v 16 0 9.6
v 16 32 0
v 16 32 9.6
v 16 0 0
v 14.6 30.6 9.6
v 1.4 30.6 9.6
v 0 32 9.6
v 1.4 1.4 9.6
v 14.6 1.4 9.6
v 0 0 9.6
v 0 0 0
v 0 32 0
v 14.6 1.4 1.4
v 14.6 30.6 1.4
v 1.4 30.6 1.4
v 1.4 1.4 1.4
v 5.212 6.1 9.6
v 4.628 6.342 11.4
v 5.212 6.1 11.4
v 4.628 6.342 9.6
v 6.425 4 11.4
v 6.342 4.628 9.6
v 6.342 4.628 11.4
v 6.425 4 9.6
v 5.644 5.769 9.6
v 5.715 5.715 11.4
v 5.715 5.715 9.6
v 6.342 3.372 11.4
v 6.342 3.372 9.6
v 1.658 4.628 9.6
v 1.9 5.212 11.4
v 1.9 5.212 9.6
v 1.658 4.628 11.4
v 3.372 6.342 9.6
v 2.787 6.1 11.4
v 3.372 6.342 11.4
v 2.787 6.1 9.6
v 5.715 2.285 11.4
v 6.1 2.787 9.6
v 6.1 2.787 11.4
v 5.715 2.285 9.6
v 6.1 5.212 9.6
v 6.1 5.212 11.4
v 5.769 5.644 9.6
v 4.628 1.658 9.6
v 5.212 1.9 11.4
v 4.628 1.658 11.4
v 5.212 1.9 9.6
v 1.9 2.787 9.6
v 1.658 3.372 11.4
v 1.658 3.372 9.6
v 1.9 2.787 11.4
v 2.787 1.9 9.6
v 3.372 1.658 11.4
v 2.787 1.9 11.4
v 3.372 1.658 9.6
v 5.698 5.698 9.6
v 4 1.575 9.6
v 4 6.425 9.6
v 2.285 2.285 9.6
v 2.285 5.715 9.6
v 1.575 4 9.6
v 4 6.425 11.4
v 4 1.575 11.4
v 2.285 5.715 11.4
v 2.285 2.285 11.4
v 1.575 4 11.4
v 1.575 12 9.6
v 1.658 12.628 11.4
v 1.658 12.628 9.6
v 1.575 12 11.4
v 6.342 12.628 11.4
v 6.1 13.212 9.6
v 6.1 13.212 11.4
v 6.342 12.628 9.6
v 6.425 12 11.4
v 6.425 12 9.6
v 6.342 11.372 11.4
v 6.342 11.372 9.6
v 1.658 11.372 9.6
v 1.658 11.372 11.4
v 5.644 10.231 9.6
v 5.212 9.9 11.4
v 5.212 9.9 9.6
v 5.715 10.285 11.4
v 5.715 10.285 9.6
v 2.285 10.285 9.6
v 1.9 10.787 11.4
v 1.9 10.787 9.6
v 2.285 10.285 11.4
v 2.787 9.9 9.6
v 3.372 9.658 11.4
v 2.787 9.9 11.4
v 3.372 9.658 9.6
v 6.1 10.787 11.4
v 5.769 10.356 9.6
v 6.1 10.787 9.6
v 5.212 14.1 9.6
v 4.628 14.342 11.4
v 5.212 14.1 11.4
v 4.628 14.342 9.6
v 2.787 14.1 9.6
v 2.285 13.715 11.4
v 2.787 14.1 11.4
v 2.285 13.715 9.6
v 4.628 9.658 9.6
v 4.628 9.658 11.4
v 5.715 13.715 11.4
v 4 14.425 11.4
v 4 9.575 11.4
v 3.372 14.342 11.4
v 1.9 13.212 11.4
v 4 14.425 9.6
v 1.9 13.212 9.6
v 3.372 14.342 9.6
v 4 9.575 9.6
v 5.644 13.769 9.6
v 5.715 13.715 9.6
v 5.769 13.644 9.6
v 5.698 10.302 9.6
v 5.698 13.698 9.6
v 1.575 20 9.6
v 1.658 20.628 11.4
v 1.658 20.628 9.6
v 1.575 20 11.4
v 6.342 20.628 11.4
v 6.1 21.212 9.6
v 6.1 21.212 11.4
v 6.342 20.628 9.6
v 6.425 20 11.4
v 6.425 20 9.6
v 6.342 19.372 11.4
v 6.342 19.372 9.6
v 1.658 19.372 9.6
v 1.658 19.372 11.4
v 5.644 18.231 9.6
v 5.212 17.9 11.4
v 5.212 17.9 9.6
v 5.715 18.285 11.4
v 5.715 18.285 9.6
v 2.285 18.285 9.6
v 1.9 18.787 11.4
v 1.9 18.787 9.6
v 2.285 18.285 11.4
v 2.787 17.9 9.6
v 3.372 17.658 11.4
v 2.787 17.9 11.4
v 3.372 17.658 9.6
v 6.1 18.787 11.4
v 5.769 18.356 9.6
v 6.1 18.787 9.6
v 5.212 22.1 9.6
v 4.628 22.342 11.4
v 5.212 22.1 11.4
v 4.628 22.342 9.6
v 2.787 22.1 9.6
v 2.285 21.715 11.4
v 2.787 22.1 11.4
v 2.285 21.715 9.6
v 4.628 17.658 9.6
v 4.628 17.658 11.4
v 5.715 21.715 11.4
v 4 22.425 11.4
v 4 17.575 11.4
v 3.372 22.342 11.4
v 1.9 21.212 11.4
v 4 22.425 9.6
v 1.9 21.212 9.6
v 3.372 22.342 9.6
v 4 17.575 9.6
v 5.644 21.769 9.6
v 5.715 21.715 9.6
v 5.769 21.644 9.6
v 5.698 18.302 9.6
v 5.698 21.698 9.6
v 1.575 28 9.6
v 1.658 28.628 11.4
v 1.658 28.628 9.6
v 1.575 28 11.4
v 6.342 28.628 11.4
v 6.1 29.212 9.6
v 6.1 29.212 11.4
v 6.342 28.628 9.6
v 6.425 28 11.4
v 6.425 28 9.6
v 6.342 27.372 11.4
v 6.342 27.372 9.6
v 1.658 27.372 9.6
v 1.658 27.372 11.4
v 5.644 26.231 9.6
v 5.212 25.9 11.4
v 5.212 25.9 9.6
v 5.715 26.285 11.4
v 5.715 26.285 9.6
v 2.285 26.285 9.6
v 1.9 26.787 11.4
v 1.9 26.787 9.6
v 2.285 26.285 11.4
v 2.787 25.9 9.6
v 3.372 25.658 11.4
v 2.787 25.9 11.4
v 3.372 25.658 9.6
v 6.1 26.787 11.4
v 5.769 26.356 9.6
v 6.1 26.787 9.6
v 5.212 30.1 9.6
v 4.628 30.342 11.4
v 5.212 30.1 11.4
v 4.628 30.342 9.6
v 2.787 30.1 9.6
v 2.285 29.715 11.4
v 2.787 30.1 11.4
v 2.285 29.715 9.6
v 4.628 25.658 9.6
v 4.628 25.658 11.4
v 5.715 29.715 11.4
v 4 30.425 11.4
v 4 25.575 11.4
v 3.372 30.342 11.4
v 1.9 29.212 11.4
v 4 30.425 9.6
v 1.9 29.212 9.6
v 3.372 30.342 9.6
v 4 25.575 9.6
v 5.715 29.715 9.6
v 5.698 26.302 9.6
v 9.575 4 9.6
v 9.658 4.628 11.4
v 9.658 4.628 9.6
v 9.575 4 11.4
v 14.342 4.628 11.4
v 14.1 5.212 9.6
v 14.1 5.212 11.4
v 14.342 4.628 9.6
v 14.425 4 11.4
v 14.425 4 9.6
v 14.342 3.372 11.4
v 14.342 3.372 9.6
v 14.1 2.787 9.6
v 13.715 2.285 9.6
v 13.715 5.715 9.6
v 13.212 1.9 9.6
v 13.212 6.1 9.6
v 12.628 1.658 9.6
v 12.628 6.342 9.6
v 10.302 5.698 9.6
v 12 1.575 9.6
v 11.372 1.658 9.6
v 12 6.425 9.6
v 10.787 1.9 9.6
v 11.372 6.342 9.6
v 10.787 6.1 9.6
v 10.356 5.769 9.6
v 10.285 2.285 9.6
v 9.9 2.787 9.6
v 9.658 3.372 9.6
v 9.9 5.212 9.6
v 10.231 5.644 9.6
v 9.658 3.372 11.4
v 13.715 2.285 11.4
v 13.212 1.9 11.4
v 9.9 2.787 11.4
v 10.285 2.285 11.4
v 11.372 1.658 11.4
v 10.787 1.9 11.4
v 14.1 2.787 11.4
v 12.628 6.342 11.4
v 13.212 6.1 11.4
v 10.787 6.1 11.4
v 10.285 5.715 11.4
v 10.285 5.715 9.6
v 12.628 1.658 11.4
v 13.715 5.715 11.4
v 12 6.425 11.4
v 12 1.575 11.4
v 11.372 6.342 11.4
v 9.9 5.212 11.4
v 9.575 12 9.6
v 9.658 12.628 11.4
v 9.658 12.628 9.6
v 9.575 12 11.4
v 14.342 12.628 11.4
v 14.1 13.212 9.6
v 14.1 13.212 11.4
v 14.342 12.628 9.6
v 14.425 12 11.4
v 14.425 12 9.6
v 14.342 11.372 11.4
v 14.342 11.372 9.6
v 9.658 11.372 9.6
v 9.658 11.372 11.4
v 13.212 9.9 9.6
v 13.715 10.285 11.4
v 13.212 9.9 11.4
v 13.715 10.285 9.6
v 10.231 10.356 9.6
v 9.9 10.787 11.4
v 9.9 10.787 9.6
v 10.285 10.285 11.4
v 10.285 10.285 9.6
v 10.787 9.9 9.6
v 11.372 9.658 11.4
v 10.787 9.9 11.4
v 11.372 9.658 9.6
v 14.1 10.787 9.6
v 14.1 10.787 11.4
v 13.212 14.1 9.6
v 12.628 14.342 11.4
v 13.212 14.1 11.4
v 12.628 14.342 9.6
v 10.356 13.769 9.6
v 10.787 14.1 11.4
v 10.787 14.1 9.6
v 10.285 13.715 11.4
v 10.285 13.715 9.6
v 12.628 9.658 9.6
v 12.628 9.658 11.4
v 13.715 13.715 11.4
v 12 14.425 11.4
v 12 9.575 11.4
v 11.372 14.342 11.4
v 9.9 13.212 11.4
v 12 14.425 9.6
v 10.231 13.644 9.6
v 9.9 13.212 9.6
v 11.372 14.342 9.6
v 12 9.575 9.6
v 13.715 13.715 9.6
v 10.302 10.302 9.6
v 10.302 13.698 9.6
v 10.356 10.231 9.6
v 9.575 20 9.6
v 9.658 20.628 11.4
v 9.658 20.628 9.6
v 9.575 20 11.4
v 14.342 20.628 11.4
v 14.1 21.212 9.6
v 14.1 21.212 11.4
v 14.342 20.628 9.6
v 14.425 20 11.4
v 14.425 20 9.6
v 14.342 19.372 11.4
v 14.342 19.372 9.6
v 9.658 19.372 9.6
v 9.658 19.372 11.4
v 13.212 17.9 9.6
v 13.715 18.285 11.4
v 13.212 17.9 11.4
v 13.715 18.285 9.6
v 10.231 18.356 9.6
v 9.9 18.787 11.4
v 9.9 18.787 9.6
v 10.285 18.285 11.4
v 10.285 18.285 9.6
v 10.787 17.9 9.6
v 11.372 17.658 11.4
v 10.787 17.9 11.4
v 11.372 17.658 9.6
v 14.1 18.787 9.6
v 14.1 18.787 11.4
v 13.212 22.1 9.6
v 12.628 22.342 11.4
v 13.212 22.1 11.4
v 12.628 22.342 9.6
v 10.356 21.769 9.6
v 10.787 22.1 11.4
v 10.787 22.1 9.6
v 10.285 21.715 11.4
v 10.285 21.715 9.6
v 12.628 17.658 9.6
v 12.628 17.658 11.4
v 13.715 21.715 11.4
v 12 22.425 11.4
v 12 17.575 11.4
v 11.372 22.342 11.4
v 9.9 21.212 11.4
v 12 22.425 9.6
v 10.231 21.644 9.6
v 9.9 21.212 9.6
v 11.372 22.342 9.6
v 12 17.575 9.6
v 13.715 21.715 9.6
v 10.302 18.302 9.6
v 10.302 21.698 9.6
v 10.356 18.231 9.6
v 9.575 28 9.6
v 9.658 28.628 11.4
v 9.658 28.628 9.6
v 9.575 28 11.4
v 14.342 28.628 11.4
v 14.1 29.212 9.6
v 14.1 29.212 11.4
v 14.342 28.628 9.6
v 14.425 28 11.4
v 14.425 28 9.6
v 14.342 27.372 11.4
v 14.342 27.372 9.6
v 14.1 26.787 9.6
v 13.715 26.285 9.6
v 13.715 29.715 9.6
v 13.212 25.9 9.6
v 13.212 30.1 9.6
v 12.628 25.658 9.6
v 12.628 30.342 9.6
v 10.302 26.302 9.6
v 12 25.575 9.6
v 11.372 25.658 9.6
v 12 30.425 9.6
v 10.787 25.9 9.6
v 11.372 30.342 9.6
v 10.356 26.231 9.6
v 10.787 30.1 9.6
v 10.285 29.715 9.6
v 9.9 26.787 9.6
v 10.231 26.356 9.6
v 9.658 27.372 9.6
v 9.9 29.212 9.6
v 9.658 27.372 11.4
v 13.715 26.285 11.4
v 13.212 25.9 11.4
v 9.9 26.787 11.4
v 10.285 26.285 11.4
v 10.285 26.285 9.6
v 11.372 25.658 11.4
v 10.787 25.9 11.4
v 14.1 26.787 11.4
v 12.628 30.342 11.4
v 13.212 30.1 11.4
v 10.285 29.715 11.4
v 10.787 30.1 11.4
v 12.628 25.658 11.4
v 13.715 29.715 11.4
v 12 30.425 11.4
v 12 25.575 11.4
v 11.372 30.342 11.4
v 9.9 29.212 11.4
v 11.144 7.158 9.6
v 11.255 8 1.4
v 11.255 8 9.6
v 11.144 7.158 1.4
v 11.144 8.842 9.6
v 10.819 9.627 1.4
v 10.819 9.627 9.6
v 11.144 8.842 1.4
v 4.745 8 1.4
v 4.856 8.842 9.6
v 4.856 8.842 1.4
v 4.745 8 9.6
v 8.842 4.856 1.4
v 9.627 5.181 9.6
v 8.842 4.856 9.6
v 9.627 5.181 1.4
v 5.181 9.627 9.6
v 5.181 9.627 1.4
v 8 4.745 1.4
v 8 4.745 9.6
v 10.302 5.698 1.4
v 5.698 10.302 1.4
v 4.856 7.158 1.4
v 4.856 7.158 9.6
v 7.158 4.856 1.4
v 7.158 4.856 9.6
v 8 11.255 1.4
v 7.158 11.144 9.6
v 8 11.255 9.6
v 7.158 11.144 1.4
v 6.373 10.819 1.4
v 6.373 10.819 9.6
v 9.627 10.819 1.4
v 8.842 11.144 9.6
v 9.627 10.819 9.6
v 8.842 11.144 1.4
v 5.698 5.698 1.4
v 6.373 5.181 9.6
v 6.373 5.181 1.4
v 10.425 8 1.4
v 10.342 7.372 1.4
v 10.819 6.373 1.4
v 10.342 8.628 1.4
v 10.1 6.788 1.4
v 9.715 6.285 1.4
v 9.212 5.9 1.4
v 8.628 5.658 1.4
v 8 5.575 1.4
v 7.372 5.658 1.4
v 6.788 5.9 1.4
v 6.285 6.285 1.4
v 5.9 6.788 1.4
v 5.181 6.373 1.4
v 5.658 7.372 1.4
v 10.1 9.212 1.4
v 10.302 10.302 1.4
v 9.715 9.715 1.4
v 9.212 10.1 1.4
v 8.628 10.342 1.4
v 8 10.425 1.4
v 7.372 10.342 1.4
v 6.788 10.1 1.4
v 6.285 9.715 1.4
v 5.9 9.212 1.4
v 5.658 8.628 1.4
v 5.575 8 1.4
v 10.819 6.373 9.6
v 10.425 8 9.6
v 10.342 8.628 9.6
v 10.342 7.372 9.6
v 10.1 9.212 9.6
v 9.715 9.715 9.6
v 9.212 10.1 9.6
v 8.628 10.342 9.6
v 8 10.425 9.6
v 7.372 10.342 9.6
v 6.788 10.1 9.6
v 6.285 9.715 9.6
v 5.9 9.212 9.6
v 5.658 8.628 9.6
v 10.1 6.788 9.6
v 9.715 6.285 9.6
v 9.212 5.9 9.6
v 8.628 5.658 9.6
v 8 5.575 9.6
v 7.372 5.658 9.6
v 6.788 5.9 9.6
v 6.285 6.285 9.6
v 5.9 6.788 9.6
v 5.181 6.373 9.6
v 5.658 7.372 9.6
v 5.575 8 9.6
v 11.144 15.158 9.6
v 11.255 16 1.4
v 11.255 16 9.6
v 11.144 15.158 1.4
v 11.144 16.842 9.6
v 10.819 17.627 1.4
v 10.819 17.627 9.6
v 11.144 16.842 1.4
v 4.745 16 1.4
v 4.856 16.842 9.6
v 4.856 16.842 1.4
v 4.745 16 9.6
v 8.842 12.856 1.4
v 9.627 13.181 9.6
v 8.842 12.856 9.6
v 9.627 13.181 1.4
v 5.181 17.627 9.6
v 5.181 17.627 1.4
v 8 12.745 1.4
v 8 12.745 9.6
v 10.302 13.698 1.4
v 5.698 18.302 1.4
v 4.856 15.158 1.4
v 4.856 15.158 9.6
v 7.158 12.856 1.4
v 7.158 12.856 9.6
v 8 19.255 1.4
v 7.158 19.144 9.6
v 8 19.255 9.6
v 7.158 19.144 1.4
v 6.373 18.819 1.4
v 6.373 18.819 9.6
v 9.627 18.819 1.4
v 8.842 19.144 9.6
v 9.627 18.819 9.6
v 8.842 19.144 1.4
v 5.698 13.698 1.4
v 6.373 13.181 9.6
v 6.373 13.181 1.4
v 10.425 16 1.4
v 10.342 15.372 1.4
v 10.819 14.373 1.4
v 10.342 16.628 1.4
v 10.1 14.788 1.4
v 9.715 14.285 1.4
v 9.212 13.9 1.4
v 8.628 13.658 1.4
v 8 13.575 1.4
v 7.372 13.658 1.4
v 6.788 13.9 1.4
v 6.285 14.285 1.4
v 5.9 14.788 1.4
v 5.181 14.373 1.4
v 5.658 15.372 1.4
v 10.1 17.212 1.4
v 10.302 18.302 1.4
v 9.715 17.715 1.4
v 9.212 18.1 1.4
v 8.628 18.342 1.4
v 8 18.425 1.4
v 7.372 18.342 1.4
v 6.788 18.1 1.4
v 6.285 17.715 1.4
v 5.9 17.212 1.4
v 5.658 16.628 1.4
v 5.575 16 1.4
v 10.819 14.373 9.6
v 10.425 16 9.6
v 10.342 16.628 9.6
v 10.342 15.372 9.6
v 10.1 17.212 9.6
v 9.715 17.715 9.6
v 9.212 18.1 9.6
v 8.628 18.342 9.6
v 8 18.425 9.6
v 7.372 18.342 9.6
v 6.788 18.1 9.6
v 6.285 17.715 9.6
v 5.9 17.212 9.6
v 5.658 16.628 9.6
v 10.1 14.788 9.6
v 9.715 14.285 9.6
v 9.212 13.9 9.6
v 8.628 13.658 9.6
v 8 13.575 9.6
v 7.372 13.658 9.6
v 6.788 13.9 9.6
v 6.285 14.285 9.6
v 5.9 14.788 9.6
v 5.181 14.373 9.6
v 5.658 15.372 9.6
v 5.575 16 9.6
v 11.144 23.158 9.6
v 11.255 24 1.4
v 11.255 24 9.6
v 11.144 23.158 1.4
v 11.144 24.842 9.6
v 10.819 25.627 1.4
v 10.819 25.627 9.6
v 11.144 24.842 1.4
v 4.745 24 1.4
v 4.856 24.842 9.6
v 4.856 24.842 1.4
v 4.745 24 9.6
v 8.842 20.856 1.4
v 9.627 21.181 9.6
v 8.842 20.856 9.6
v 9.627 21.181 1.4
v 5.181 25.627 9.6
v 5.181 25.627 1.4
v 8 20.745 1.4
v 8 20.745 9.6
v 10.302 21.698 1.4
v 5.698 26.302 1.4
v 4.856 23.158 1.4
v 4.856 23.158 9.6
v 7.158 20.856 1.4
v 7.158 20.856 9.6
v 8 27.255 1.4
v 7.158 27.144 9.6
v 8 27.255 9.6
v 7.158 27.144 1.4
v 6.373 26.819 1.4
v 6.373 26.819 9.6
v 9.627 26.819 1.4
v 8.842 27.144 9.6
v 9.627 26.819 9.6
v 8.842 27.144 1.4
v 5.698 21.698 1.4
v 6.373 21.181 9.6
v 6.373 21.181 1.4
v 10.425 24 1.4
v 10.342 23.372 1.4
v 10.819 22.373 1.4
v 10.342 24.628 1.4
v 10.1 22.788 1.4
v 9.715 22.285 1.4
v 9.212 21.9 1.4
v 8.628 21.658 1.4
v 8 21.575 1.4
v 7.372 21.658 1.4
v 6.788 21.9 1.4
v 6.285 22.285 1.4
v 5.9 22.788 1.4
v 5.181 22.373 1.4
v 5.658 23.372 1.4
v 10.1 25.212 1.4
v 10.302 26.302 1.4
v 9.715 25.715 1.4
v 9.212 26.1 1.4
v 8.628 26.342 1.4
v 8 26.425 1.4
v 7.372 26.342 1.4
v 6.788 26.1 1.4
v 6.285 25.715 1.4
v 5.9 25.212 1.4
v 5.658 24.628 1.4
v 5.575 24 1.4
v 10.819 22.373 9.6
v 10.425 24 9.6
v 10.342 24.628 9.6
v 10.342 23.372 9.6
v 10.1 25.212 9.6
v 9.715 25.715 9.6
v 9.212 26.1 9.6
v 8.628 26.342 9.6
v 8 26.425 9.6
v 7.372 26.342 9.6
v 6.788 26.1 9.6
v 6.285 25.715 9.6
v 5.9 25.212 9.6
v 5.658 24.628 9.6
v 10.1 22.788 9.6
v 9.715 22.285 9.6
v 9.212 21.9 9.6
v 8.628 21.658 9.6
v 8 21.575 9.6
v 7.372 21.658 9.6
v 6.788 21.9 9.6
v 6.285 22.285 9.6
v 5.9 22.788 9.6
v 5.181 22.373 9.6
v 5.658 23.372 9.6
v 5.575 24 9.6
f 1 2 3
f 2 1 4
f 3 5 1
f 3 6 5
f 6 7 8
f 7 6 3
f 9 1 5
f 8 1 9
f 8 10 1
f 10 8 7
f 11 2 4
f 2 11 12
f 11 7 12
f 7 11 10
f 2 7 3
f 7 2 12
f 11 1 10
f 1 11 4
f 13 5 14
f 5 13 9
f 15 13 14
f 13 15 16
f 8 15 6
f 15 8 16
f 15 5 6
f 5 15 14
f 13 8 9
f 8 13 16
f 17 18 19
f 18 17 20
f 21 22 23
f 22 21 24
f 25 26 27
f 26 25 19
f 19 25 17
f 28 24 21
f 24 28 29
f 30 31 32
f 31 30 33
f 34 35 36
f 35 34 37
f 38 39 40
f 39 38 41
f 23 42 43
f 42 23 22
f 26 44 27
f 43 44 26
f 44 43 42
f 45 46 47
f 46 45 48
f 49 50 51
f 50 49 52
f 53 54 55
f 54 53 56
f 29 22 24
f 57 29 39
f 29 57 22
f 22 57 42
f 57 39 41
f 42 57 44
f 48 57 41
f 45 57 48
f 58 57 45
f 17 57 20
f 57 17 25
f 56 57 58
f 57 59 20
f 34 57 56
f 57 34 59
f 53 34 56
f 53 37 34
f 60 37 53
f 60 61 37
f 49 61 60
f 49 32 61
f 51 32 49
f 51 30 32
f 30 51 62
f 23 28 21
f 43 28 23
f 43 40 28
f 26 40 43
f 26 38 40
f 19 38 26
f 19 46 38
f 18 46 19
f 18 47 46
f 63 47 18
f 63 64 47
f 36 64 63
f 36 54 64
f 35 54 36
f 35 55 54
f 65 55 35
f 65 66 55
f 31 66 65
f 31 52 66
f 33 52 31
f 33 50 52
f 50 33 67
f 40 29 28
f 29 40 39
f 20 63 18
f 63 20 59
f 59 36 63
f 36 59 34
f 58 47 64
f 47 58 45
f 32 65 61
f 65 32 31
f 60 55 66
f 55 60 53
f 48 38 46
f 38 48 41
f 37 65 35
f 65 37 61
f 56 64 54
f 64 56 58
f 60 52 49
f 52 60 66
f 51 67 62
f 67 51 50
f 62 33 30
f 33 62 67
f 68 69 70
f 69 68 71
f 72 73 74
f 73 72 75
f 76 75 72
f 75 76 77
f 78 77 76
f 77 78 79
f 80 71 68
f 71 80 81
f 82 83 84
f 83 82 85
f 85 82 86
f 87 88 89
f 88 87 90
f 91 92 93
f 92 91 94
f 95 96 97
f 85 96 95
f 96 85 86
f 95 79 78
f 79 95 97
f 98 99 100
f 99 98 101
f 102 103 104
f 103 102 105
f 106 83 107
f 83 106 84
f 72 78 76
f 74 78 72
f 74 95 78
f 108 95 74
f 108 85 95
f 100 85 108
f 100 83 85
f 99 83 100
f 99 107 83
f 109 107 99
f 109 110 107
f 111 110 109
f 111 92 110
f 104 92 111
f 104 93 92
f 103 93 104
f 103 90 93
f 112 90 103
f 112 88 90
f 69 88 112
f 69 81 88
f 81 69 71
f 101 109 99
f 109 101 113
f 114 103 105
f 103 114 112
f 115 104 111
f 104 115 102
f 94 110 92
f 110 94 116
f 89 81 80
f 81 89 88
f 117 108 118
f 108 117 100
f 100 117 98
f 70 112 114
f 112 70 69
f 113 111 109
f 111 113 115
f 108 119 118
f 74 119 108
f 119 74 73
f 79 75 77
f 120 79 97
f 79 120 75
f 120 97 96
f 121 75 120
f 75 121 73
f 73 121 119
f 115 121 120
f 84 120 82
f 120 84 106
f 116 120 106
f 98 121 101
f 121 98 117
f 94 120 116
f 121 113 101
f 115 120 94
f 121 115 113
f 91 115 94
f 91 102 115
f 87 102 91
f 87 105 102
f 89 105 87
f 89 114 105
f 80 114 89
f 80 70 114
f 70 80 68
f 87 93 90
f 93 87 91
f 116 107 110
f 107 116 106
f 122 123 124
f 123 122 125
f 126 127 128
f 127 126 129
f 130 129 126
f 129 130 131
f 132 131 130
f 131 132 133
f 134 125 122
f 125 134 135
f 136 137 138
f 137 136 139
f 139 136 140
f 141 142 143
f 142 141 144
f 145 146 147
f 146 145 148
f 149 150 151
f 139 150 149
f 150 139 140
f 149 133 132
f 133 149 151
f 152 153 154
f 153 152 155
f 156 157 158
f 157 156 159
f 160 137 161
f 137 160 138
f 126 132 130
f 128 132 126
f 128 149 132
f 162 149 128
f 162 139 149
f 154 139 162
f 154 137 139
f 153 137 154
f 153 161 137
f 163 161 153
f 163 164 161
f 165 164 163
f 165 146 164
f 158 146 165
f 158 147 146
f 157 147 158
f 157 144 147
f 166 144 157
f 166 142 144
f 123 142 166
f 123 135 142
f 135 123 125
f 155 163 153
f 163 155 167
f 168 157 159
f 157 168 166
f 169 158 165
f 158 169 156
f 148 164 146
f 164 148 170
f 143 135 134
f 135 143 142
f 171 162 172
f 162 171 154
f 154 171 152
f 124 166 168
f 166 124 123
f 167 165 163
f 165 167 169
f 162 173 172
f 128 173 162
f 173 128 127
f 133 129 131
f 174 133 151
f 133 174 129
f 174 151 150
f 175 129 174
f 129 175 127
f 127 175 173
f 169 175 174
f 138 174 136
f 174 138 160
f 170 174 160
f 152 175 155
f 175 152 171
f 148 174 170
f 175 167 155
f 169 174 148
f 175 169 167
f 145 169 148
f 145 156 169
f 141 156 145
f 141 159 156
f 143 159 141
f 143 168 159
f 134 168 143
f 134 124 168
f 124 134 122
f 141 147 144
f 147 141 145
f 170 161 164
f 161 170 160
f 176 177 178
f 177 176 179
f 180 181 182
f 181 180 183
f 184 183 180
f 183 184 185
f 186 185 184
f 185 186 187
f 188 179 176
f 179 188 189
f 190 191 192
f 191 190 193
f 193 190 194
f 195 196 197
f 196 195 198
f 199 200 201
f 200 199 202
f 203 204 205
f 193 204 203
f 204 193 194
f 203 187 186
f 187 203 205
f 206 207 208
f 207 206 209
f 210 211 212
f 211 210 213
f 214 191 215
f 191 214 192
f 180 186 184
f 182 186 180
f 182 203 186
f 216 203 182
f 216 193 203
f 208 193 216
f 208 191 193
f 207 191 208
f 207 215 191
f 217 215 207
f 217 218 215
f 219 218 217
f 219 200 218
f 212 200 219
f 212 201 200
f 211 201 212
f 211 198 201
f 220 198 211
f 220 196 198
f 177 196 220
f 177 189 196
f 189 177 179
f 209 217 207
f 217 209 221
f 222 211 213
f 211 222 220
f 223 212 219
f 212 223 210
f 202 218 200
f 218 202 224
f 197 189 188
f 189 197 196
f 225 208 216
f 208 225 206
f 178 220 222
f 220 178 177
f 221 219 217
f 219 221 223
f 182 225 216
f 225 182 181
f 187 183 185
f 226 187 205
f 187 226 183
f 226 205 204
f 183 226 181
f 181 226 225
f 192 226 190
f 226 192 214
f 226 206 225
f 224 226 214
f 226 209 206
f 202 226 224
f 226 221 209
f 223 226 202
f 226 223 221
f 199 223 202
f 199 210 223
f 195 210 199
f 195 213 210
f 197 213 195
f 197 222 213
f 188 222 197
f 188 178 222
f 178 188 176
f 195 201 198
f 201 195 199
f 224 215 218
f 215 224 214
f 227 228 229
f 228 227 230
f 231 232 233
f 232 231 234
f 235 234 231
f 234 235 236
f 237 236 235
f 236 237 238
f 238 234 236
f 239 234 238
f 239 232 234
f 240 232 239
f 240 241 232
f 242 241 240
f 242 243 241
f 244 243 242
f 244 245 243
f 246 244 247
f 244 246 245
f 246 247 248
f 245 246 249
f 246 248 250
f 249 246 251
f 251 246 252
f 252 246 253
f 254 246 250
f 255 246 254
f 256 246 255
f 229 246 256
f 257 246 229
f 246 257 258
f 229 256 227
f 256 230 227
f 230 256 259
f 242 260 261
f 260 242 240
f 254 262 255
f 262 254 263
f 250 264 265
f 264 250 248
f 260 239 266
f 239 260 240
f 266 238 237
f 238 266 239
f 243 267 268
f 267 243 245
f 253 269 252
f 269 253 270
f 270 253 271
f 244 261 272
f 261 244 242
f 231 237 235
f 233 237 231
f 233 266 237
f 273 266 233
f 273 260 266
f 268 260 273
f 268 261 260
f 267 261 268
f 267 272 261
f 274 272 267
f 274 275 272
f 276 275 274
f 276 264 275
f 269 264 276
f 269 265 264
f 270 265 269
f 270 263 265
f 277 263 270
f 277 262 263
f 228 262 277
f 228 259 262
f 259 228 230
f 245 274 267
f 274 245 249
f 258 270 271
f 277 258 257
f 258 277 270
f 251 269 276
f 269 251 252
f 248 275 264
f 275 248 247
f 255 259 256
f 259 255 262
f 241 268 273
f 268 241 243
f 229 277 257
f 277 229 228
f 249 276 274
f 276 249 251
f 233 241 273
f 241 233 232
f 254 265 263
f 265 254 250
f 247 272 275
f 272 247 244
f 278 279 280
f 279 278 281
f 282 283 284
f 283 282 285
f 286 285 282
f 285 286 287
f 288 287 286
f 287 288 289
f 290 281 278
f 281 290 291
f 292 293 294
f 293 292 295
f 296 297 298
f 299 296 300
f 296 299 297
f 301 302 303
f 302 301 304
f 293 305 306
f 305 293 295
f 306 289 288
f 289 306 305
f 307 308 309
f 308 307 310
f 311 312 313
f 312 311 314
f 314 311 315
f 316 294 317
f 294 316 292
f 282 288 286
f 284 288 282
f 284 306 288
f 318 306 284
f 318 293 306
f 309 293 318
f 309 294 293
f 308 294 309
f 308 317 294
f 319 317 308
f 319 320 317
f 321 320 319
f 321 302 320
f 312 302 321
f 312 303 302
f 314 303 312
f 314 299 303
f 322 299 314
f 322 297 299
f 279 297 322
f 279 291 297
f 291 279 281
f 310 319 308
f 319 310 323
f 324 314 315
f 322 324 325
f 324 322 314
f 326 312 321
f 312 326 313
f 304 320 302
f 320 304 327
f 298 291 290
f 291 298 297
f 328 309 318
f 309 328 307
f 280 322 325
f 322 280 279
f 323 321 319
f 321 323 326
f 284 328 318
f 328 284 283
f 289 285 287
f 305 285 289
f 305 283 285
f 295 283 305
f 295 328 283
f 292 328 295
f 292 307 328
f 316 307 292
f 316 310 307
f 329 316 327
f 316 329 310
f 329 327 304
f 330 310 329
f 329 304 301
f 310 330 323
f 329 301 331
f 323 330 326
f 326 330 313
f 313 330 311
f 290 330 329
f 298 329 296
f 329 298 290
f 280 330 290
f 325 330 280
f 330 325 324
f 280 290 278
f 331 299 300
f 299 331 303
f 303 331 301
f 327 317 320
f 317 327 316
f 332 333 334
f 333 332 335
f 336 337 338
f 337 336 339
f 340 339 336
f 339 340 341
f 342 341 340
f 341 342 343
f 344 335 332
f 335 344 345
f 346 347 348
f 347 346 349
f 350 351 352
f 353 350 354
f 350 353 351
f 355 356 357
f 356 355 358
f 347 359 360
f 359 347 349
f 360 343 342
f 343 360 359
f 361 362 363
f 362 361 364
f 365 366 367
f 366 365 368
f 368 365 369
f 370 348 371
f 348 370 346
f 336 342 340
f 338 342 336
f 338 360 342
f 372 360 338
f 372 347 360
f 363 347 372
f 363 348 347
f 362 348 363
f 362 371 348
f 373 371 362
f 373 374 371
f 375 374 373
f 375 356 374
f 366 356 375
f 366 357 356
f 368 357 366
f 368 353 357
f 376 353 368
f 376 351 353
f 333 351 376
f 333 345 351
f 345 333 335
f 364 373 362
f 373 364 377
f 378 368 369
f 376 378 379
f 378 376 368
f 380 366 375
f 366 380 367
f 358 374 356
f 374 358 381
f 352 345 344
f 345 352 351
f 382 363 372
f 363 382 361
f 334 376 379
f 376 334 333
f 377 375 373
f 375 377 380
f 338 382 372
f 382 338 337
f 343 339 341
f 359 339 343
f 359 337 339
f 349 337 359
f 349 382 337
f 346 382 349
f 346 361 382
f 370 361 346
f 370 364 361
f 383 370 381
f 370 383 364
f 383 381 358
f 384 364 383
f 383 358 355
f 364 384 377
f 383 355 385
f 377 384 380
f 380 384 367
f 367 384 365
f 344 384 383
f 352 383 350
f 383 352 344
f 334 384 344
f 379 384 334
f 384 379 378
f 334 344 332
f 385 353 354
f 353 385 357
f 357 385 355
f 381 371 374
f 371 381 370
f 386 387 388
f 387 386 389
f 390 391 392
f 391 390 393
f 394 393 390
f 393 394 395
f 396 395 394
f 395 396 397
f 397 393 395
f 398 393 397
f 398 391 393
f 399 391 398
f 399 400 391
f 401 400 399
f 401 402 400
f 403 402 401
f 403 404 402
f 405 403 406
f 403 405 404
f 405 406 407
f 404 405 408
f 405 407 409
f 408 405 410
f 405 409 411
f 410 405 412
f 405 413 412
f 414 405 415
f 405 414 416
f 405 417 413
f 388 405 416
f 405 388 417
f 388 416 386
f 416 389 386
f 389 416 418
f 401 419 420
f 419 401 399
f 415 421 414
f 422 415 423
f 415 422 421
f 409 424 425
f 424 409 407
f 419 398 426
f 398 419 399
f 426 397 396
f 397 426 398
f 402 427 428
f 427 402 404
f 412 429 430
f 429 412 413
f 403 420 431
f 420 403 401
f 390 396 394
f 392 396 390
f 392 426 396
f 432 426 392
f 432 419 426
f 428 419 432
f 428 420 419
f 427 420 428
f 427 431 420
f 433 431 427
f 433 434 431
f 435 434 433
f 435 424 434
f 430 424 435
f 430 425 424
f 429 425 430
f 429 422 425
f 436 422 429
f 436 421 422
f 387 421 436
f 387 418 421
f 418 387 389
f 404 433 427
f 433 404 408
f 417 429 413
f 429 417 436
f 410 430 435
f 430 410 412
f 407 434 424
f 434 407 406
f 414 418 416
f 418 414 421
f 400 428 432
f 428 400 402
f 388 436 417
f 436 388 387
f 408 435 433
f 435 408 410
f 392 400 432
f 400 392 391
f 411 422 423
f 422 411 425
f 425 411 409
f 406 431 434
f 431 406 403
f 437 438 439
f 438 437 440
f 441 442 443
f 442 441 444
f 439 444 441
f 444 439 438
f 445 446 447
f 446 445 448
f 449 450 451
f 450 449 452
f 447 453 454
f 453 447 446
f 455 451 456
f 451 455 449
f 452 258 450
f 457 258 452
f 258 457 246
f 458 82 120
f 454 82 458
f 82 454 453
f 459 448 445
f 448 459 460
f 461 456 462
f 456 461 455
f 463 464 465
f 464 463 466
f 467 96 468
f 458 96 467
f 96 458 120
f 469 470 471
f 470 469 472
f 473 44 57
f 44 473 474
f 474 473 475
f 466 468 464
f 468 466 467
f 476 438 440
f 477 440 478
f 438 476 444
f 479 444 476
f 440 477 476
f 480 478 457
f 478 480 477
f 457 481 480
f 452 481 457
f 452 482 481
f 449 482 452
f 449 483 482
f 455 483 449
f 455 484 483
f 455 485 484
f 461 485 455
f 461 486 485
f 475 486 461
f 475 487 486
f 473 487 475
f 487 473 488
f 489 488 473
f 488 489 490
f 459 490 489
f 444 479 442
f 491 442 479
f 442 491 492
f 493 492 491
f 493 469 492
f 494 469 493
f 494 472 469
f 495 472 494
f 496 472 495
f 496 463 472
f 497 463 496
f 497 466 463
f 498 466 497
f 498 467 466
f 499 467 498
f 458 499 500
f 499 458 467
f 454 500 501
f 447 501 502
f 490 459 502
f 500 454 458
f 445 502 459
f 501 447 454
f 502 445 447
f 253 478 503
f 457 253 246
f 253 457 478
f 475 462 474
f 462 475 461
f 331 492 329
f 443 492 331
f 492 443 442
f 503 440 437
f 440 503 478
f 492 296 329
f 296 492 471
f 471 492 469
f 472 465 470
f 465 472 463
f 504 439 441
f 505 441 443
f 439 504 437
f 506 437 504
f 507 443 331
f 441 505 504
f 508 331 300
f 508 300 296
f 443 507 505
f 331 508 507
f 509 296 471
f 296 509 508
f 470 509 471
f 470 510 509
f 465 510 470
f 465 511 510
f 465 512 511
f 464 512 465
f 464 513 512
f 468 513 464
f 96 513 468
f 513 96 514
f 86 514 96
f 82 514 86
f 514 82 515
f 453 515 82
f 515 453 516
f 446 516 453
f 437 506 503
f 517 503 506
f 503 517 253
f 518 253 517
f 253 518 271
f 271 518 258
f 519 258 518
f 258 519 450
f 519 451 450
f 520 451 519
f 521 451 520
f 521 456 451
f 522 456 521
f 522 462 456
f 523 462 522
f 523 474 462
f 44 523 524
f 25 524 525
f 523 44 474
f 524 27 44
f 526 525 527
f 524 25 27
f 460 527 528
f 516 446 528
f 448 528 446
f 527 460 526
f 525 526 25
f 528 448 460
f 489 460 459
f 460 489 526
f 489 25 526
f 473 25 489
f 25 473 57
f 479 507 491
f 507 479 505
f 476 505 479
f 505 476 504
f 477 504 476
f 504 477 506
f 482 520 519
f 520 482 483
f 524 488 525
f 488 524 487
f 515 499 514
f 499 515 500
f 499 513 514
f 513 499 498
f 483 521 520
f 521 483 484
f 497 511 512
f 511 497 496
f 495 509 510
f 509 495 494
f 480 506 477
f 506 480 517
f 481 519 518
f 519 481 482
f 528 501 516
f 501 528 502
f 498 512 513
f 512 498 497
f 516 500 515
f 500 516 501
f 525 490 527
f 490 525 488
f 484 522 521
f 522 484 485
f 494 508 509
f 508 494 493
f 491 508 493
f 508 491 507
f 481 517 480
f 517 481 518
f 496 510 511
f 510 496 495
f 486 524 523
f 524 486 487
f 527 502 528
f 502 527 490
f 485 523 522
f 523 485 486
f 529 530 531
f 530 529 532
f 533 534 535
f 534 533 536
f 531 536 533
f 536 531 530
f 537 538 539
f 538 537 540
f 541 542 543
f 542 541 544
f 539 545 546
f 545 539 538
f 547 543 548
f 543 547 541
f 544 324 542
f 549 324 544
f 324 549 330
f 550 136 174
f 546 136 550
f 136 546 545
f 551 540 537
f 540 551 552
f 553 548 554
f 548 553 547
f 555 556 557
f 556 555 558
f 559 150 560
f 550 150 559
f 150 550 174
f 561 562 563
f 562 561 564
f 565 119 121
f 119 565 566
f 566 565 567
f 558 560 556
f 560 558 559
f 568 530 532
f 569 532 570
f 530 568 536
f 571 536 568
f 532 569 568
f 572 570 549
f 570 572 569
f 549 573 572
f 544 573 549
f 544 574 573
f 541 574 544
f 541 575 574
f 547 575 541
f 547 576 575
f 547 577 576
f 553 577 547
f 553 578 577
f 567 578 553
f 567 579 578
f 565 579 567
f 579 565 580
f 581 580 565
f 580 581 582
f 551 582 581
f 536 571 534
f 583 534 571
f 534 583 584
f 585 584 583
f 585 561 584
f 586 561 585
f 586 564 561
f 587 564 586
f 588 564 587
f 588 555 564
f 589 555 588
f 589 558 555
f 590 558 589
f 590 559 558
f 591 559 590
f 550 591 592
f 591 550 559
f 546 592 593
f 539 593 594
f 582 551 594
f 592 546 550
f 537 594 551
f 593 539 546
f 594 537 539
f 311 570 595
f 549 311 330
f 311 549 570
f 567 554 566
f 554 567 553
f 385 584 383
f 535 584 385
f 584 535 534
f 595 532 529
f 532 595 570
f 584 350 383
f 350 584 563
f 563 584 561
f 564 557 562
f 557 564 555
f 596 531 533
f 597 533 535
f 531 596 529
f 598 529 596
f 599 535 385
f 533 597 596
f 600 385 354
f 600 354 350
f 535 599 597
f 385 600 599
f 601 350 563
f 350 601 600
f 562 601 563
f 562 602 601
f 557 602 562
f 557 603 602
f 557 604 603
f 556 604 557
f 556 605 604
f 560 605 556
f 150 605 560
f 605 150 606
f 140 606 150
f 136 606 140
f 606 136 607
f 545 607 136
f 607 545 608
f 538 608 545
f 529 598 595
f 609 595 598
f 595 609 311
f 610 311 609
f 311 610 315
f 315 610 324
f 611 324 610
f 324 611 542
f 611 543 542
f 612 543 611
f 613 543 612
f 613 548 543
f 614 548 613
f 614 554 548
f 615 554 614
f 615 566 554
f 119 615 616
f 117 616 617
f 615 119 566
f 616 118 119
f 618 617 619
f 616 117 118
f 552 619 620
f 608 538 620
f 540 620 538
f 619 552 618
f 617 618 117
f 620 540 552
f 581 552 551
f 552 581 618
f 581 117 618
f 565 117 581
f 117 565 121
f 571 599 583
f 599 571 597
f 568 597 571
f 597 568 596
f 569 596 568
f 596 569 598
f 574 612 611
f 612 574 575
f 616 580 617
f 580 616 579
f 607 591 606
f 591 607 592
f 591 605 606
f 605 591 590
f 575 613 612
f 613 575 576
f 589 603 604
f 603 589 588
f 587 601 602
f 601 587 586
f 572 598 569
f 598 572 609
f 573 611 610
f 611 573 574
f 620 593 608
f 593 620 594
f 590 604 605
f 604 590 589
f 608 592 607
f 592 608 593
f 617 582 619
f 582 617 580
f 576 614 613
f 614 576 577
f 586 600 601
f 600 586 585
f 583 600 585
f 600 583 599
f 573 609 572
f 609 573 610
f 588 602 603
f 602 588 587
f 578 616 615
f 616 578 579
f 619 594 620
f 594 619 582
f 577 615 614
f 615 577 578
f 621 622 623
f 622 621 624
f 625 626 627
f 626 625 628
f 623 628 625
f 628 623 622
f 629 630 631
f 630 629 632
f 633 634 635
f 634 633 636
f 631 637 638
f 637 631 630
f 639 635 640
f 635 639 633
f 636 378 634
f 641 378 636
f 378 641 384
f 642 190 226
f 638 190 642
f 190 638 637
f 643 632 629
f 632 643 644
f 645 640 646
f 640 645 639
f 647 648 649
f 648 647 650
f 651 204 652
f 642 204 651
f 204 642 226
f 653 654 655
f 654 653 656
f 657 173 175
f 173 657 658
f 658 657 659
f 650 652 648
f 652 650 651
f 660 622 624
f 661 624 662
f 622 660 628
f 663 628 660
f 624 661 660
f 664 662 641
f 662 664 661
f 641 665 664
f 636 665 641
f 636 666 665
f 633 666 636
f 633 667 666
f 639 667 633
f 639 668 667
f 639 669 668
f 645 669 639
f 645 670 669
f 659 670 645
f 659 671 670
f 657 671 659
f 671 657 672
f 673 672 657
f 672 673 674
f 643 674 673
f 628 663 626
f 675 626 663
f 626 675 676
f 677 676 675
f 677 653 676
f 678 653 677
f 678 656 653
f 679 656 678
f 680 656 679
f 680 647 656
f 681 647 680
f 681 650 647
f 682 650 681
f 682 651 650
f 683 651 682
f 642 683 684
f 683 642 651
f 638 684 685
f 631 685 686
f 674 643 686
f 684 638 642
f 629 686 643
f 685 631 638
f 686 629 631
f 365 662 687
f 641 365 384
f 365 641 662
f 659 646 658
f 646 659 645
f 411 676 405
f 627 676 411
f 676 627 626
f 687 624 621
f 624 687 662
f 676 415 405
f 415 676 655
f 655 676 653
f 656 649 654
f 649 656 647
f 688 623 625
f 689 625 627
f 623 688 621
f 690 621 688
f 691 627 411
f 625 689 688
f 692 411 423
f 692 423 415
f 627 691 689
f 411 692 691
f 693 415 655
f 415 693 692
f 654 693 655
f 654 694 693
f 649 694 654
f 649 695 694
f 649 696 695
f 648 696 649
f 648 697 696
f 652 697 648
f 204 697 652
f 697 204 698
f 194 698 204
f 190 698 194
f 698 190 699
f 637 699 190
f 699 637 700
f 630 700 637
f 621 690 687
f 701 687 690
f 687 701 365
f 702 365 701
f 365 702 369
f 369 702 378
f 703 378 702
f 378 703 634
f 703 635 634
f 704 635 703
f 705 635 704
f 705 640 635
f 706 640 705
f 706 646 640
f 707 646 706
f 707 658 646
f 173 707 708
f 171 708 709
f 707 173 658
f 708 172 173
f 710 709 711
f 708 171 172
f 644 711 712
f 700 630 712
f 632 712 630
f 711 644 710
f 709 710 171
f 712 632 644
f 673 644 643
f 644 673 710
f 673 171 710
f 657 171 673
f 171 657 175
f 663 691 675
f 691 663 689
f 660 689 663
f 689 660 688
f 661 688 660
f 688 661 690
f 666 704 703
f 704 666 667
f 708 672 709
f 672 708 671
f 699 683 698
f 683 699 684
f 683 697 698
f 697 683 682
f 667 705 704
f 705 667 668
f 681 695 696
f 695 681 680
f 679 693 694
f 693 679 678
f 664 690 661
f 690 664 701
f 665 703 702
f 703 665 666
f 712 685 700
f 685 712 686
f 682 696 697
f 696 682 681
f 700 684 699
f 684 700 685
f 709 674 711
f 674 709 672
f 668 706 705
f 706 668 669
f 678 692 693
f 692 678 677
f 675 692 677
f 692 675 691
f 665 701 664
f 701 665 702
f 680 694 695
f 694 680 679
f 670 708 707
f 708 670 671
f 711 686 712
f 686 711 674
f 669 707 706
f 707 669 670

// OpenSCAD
// LEGO Compatible Brick - Parametric
// Print settings: 0.2mm layer, 3 walls, 20% infill, no supports
// Tested on P2S

// ─── Parameters ───────────────────────────────────────────
studs_x = 2;   // Number of studs along X
studs_y = 4;   // Number of studs along Y
plates  = 3;   // Height in plate units (1 plate = 3.2mm, 3 plates = 1 brick)

// ─── LEGO constants (mm) ──────────────────────────────────
STUD_PITCH   = 8.0;
STUD_D       = 4.85;   // Slightly undersized for fit
STUD_H       = 1.8;
PLATE_H      = 3.2;
WALL_T       = 1.4;
TUBE_OD      = 6.51;
TUBE_ID      = 4.85;
PLAY         = 0.1;    // Clearance

// ─── Derived ──────────────────────────────────────────────
W  = studs_x * STUD_PITCH;
L  = studs_y * STUD_PITCH;
H  = plates  * PLATE_H;

module stud() {
    cylinder(d = STUD_D, h = STUD_H, $fn = 24);
}

module anti_stud_tube() {
    difference() {
        cylinder(d = TUBE_OD, h = H - WALL_T, $fn = 24);
        cylinder(d = TUBE_ID, h = H - WALL_T, $fn = 24);
    }
}

module brick() {
    difference() {
        // Outer shell
        cube([W, L, H]);
        // Hollow inside
        translate([WALL_T, WALL_T, WALL_T])
            cube([W - 2*WALL_T, L - 2*WALL_T, H]);
    }

    // Studs on top
    for (x = [0 : studs_x - 1])
        for (y = [0 : studs_y - 1])
            translate([STUD_PITCH/2 + x*STUD_PITCH, STUD_PITCH/2 + y*STUD_PITCH, H])
                stud();

    // Anti-stud tubes (only when inner grid exists)
    if (studs_x > 1 && studs_y > 1)
        for (x = [0 : studs_x - 2])
            for (y = [0 : studs_y - 2])
                translate([STUD_PITCH + x*STUD_PITCH, STUD_PITCH + y*STUD_PITCH, WALL_T])
                    anti_stud_tube();
}

brick();
